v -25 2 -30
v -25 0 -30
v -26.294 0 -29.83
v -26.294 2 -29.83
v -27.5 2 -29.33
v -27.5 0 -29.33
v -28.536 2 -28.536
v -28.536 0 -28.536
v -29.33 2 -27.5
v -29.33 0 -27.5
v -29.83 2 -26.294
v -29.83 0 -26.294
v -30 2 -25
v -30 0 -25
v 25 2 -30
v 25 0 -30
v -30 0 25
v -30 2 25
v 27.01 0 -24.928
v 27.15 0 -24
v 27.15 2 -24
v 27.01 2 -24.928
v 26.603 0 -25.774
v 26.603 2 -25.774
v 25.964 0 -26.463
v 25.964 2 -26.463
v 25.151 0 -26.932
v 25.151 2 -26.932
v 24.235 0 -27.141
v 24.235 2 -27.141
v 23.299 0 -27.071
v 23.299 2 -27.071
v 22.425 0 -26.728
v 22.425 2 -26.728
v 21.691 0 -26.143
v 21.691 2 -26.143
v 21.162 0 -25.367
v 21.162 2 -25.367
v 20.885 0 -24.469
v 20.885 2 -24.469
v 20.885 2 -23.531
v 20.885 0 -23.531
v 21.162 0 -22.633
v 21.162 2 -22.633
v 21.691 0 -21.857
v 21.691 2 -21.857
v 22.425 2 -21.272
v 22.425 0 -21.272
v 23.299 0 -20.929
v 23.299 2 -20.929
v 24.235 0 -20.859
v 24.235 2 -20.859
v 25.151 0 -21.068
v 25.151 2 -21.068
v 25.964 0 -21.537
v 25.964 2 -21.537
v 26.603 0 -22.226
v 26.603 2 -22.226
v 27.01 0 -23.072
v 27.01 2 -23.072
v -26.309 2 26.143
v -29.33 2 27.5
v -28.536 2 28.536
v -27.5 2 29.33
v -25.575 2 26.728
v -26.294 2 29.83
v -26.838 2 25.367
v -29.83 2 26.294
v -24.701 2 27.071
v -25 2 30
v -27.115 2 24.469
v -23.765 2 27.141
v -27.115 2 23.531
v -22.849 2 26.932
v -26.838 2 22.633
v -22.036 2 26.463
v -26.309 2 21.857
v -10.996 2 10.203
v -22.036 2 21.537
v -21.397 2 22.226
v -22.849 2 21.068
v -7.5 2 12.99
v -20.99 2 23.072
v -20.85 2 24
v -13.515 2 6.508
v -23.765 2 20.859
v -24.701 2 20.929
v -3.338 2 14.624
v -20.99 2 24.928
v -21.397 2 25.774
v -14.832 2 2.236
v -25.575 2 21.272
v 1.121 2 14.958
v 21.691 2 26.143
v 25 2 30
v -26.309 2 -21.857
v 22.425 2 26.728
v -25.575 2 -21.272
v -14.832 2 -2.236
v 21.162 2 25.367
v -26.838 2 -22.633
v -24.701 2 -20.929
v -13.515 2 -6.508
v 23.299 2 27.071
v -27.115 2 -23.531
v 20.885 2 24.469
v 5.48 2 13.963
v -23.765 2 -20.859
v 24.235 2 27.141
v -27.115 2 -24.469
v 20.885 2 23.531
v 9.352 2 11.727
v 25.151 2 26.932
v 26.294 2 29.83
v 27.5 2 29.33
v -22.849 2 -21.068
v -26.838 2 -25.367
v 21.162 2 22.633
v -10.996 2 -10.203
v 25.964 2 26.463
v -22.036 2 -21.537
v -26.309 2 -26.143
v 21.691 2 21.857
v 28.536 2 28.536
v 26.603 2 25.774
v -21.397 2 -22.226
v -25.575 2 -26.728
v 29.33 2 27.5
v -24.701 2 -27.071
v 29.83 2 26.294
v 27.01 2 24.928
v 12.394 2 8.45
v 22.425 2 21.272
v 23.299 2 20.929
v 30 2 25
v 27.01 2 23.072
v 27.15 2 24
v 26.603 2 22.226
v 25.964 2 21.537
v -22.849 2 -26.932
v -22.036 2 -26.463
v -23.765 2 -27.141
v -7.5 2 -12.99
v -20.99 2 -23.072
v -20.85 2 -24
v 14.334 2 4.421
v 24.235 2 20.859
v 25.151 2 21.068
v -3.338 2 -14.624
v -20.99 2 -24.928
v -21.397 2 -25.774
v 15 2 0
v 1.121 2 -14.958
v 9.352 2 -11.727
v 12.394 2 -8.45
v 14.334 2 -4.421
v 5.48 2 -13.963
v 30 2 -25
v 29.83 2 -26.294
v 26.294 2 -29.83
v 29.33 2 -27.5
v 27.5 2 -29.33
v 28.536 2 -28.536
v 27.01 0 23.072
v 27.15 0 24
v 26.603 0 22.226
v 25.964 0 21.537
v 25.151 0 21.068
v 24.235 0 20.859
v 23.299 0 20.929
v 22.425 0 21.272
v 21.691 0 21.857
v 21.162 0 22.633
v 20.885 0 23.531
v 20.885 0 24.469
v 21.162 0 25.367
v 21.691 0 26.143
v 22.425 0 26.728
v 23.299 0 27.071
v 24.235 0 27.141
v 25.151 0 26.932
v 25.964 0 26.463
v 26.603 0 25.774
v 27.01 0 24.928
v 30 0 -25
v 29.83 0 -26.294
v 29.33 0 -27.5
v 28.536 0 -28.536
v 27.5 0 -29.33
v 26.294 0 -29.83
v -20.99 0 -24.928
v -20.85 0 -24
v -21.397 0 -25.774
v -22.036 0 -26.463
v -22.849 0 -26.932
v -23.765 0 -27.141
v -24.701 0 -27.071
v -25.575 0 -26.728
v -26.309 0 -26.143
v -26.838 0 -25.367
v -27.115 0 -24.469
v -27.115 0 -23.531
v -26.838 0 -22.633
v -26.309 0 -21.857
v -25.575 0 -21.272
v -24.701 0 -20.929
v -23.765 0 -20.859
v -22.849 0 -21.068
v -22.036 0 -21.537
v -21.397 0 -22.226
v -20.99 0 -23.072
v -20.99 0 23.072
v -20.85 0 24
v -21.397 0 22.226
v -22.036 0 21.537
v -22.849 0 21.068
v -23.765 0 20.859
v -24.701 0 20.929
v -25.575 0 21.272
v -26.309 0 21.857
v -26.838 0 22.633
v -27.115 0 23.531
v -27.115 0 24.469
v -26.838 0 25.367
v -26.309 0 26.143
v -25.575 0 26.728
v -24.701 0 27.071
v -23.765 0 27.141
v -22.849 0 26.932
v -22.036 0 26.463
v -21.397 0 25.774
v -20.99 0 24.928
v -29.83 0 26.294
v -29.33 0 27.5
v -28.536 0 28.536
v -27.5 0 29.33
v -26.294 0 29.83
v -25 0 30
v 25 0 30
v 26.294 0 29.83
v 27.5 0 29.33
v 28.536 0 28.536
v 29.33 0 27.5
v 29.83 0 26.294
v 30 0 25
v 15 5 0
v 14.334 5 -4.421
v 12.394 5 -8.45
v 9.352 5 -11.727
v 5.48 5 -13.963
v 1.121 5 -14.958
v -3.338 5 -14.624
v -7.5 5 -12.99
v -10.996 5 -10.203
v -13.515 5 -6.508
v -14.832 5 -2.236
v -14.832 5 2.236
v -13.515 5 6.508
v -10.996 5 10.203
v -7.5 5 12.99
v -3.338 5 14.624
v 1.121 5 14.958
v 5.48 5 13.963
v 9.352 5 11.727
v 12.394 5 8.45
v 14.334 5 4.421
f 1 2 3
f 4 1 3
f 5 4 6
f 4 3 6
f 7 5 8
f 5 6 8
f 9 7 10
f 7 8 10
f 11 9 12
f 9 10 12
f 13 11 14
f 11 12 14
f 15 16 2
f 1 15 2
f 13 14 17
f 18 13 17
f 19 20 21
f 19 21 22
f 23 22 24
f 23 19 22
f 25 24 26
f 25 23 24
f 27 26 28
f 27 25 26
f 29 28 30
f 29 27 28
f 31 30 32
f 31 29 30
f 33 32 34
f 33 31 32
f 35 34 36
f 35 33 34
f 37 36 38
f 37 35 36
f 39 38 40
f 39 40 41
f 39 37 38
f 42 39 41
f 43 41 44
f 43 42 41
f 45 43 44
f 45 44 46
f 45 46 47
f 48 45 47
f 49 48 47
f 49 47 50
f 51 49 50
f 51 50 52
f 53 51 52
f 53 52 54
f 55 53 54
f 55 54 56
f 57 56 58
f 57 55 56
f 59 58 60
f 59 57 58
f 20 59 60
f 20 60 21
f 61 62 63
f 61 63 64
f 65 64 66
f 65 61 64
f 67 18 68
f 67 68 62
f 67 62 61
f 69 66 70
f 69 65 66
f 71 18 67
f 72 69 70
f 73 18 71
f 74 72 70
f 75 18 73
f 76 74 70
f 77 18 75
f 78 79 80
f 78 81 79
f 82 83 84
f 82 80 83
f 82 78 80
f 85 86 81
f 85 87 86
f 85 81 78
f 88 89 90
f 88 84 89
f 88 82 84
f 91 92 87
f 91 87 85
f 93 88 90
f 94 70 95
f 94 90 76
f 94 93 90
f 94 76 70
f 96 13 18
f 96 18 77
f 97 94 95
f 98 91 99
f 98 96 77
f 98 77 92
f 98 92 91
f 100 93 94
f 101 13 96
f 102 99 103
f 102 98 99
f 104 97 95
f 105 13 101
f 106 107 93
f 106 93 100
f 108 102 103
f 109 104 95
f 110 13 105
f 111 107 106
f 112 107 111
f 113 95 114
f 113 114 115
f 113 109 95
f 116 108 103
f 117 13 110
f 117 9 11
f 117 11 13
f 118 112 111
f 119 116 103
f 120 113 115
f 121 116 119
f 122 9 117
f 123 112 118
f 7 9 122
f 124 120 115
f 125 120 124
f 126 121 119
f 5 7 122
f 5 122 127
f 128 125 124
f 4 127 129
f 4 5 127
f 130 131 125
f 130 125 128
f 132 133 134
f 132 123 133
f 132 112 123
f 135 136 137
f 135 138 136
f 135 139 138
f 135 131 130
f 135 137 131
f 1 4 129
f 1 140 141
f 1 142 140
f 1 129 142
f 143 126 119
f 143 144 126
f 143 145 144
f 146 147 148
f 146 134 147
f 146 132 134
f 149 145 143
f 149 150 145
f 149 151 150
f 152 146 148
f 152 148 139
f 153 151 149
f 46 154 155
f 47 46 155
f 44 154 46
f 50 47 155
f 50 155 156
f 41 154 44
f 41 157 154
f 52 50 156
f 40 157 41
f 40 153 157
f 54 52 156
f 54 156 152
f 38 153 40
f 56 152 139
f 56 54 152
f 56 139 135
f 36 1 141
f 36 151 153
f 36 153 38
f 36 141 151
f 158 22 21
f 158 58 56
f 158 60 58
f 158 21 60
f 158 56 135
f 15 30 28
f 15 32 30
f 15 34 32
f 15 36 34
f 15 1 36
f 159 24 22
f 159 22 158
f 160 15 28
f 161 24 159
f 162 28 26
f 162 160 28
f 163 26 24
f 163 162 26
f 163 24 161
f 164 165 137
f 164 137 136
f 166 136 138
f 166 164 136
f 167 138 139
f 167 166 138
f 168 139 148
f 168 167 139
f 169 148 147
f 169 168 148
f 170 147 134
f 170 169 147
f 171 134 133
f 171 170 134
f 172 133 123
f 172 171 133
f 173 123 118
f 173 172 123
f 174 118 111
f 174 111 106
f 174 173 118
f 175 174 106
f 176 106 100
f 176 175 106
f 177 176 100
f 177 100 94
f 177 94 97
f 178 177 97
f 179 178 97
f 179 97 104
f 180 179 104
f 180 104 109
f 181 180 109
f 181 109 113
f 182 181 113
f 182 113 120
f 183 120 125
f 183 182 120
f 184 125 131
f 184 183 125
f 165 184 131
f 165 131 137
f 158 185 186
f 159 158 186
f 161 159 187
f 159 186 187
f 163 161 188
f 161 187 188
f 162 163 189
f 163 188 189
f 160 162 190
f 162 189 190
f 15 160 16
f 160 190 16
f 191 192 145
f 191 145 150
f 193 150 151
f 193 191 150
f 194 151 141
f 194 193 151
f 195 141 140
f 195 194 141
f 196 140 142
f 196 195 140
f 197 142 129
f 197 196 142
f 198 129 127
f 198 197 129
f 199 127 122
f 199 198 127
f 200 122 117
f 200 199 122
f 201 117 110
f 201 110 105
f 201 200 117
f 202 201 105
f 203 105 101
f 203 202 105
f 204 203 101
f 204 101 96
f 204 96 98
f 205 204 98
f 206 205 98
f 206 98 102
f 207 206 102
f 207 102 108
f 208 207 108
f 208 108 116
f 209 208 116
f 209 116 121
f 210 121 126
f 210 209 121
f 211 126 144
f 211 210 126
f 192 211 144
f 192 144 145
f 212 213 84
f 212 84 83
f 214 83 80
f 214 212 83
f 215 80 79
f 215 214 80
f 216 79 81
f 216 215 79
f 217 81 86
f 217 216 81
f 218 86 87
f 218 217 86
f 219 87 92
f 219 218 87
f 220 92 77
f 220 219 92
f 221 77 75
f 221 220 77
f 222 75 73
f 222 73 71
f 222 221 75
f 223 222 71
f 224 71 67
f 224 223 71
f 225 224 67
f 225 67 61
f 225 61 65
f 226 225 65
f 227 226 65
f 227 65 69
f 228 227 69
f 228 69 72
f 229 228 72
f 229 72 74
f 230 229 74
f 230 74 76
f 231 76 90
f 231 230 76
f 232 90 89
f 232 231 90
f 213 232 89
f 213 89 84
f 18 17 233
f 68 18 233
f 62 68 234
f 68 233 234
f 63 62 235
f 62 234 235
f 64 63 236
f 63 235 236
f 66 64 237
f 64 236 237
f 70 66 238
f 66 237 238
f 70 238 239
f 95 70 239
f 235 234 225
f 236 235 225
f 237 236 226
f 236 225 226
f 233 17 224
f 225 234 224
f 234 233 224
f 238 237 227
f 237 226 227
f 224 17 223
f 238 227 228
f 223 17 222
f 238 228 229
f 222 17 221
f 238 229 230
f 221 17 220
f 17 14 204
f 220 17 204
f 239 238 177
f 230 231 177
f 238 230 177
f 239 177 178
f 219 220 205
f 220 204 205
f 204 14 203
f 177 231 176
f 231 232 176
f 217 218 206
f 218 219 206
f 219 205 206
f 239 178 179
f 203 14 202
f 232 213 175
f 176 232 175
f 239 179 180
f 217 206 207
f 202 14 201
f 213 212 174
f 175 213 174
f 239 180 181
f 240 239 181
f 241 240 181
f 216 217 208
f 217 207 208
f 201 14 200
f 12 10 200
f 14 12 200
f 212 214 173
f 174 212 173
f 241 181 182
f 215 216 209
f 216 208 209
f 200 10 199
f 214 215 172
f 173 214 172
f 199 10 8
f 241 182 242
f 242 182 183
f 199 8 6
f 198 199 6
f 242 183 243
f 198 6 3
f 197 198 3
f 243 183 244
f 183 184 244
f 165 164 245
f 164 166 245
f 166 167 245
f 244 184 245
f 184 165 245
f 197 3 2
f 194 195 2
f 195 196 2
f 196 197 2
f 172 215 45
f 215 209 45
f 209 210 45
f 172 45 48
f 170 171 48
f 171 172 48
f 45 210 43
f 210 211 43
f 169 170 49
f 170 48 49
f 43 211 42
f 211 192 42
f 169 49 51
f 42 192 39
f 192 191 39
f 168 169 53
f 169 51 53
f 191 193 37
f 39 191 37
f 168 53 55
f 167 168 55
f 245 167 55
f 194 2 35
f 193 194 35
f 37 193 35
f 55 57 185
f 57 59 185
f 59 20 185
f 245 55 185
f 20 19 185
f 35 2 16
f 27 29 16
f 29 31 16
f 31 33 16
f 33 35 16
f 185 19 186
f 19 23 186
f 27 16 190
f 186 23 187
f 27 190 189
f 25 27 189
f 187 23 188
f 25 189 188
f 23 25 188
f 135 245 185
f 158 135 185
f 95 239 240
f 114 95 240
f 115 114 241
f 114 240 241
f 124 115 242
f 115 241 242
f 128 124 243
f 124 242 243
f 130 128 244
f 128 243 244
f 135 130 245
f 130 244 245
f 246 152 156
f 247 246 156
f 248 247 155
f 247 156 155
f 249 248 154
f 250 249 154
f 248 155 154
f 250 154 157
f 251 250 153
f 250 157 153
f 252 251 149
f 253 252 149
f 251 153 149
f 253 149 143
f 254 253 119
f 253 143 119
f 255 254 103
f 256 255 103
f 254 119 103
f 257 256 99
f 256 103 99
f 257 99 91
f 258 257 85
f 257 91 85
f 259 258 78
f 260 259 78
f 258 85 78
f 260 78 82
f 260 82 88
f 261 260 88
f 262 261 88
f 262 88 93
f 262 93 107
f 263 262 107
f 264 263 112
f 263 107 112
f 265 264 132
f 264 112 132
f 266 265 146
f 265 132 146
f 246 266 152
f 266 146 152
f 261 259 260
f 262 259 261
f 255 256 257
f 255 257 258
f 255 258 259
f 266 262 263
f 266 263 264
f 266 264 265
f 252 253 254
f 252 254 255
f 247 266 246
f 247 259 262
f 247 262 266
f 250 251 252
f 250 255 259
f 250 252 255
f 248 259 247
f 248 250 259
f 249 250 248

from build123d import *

# Parameters (mm, degrees)
ESQUISSE1_R        = 3.15
BOSS_EXTRU_1_DEPTH = 2
ESQUISSE2_R        = 15
BOSS_EXTRU_2_DEPTH = 3


with BuildPart() as part:
    # Esquisse1 → Boss.-Extru.1 (new body)
    with BuildSketch(Plane(origin=(0, 0, 0), x_dir=(1, 0, 0), z_dir=(0, 1, 0))):
        with BuildLine():
            Line((-25, -30), (25, -30))
            ThreePointArc((25, -30), (28.535533906, -28.535533906), (30, -25))
            Line((30, -25), (30, 25))
            ThreePointArc((30, 25), (28.535533906, 28.535533906), (25, 30))
            Line((25, 30), (-25, 30))
            ThreePointArc((-25, 30), (-28.535533906, 28.535533906), (-30, 25))
            Line((-30, 25), (-30, -25))
            ThreePointArc((-30, -25), (-28.535533906, -28.535533906), (-25, -30))
        make_face()
        with Locations((-24, 24)):
            Circle(ESQUISSE1_R, mode=Mode.SUBTRACT)
        with Locations((24, 24)):
            Circle(ESQUISSE1_R, mode=Mode.SUBTRACT)
        with Locations((24, -24)):
            Circle(ESQUISSE1_R, mode=Mode.SUBTRACT)
        with Locations((-24, -24)):
            Circle(ESQUISSE1_R, mode=Mode.SUBTRACT)
    extrude(amount=BOSS_EXTRU_1_DEPTH)

    # Esquisse2 → Boss.-Extru.2 (add)
    with BuildSketch(Plane(origin=(0, 2, 0), x_dir=(1, 0, 0), z_dir=(0, 1, 0))):
        Circle(ESQUISSE2_R)
    extrude(amount=BOSS_EXTRU_2_DEPTH)


solid = part.part
